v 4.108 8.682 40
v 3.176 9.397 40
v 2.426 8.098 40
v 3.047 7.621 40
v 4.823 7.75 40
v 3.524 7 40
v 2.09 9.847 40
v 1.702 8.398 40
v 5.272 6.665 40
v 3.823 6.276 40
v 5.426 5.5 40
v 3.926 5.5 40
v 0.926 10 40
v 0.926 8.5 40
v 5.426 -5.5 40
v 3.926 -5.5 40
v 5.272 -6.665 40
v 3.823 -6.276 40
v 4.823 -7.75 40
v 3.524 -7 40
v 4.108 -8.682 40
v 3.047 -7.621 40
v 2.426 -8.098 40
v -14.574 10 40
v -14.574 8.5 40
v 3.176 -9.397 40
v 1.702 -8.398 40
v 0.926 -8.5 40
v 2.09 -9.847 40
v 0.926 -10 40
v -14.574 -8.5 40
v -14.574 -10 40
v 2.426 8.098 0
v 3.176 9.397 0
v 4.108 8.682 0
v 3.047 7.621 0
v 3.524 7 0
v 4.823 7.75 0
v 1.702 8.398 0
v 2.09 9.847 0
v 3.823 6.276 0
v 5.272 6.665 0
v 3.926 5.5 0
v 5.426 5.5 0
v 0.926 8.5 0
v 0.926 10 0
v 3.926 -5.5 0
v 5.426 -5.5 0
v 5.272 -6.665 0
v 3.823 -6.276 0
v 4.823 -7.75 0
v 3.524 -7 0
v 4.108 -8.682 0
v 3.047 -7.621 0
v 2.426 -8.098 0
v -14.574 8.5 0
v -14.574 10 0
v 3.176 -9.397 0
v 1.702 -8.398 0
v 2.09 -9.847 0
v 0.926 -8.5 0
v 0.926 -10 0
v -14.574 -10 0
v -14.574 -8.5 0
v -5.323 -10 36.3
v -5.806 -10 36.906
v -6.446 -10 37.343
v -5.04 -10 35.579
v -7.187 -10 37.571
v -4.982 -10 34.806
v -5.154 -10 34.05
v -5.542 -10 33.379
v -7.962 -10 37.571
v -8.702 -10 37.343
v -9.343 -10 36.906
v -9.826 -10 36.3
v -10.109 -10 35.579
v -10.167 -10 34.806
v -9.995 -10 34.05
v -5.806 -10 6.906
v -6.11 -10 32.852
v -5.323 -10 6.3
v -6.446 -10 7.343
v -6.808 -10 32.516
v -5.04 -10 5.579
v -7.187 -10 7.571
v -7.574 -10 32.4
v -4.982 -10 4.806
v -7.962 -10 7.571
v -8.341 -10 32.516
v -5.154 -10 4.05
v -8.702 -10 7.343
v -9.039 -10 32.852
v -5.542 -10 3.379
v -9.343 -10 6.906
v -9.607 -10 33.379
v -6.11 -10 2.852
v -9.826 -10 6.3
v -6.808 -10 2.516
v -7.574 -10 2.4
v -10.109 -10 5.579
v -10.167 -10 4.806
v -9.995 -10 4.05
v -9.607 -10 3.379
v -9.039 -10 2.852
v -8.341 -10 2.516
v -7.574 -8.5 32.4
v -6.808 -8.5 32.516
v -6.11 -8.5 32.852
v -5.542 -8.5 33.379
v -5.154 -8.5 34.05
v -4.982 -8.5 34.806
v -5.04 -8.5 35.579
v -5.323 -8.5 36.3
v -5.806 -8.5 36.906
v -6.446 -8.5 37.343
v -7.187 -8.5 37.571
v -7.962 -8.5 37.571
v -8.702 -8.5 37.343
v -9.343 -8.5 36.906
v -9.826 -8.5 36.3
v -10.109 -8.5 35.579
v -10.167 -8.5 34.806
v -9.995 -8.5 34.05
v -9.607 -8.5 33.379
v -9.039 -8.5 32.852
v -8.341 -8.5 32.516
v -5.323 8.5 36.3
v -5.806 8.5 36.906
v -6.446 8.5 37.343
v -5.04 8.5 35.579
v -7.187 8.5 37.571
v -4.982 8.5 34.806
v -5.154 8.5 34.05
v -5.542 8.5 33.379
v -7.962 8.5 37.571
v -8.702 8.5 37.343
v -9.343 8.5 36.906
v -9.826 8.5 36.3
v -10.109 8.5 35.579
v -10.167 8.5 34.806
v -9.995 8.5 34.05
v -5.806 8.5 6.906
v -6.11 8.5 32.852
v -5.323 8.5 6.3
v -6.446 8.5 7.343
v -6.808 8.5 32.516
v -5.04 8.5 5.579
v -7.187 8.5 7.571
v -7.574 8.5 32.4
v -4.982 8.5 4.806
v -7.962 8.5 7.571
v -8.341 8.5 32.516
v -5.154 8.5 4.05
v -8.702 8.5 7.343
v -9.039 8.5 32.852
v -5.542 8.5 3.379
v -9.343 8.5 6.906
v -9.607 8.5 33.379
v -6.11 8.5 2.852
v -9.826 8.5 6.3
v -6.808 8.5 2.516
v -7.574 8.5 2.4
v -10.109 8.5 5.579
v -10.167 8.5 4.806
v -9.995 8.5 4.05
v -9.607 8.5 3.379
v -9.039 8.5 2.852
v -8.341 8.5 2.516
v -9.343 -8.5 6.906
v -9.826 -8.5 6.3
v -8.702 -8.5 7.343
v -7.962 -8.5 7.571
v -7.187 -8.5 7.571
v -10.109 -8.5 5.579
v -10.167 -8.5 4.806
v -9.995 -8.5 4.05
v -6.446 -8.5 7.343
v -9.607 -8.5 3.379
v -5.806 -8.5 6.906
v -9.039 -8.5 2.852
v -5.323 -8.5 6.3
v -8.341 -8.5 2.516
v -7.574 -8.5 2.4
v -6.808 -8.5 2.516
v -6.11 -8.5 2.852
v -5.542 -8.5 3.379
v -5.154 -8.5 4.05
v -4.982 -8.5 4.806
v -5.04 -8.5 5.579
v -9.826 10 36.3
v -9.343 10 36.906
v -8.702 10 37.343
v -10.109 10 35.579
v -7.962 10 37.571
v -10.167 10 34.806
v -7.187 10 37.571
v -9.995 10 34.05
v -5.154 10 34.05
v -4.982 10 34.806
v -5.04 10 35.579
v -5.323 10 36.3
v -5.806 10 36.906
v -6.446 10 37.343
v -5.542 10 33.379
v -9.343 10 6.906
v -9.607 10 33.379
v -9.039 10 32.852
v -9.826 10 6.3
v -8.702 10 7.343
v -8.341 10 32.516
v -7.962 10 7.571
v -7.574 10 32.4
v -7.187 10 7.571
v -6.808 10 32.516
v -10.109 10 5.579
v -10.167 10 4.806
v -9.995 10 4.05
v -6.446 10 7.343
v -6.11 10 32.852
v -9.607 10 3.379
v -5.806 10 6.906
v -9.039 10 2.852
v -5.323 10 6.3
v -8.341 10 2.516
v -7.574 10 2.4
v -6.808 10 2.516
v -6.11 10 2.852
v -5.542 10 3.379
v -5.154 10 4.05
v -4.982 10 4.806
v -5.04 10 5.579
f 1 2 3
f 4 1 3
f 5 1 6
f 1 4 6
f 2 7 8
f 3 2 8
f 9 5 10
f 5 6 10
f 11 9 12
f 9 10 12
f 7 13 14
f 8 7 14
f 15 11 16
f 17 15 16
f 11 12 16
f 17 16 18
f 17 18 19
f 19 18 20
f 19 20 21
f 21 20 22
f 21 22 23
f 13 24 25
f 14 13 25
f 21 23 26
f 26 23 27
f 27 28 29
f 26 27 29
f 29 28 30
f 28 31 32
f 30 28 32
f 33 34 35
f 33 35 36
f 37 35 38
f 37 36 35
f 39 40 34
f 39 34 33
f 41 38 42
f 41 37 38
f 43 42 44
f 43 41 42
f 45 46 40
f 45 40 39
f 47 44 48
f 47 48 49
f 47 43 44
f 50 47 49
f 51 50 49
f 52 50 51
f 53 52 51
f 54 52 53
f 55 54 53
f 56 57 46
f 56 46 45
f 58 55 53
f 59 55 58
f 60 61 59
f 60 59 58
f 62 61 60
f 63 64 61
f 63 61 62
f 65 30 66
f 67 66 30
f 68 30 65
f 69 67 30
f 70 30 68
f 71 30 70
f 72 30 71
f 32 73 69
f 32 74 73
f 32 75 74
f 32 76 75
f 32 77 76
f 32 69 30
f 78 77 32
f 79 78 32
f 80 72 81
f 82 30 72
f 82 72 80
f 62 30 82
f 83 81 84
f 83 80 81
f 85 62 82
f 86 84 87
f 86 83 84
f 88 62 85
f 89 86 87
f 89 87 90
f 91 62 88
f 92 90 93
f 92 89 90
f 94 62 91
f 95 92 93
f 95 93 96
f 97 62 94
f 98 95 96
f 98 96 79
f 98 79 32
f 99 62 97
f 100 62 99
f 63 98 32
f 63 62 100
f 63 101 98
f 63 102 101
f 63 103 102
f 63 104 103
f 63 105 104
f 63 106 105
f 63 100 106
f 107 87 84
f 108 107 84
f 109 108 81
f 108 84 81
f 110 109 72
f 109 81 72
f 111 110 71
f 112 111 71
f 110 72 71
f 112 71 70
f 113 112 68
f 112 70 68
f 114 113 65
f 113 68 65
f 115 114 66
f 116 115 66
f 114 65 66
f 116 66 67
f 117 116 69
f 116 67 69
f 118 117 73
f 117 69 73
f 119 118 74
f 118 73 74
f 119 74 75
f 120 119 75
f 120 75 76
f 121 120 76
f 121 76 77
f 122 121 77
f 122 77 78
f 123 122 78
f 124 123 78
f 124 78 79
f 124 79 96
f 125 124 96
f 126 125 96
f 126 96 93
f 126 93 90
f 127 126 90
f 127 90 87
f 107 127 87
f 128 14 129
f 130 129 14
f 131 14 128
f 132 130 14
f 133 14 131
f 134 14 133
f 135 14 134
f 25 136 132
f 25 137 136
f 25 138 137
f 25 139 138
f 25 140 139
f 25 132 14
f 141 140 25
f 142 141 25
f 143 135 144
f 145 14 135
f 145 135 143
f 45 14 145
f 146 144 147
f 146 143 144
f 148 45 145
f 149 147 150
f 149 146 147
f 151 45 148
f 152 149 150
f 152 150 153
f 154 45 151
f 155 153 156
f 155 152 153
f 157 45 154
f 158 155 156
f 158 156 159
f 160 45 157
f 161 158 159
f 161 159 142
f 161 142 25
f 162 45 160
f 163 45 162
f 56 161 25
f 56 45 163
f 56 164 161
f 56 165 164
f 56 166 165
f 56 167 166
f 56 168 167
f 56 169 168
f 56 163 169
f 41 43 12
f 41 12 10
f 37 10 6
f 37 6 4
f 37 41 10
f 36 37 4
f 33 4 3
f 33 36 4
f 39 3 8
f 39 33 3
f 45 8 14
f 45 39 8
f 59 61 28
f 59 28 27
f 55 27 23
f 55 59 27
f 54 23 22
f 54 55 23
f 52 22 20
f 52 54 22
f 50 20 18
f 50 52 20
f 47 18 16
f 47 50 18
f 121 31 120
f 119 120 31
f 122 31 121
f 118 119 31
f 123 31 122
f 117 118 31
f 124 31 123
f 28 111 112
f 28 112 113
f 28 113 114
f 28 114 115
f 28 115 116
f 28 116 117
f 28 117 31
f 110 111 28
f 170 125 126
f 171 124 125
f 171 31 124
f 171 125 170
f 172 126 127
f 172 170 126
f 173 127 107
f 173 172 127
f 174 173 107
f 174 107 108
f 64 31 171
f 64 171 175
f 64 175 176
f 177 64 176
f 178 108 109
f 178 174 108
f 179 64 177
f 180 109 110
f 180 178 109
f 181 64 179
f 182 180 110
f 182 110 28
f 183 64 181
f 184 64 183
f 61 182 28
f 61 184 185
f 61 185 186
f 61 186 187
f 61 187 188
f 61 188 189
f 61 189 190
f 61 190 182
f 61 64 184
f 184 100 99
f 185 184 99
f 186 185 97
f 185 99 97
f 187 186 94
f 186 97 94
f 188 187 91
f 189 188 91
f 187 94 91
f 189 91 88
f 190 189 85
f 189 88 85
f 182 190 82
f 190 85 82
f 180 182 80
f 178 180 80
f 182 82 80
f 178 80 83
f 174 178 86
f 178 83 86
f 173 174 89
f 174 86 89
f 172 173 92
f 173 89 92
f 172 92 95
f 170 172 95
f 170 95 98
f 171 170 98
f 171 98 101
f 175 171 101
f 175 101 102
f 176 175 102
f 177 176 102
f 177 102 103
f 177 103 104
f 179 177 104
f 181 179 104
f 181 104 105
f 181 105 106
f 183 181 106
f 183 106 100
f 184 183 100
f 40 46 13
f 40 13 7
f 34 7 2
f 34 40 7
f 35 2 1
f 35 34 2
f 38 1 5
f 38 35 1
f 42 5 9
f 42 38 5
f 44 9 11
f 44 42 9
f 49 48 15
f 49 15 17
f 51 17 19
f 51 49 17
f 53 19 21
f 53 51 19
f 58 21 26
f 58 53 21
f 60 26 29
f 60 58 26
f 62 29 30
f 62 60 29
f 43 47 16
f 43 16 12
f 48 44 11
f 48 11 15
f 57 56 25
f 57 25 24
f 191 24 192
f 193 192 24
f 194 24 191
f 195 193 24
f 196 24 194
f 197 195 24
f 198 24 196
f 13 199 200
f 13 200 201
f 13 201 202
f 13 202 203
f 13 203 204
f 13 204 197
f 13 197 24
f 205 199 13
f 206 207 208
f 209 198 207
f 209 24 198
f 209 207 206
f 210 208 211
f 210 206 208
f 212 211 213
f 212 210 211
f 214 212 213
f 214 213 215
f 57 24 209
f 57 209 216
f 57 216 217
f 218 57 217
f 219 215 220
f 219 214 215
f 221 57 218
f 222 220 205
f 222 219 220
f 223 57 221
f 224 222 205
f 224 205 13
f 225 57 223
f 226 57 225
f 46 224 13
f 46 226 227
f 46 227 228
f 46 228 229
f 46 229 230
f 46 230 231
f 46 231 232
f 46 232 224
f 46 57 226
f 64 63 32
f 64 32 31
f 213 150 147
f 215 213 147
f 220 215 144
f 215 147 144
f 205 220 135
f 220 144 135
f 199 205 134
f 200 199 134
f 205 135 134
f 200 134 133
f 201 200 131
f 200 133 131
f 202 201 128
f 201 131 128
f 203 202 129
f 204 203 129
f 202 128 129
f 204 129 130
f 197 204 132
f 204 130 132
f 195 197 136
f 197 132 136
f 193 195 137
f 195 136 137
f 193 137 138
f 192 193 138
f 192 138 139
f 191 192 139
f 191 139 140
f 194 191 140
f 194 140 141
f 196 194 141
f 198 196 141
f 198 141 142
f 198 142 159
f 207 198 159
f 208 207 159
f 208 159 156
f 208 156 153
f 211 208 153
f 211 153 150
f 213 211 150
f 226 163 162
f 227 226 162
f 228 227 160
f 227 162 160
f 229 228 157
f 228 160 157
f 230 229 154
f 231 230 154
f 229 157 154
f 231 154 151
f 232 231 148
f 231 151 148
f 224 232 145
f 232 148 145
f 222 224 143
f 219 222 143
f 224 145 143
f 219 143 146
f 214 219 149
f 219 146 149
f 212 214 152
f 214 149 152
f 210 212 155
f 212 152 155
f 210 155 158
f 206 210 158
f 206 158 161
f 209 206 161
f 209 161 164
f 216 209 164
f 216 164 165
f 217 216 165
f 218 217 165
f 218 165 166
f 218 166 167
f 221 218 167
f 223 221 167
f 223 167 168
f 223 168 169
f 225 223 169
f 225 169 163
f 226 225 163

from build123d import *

# Parameters (mm, degrees)
AUFSATZ_LINEAR_AUSTRAGEN1_DEPTH = 40
SCHNITT_LINEAR_AUSTRAGEN1_REACH = 49.036
SKIZZE2_R                       = 2.6


with BuildPart() as part:
    # Skizze1 → Aufsatz-Linear austragen1 (new body)
    with BuildSketch(Plane(origin=(0, 0, 0), x_dir=(0, 1, 0), z_dir=(0, 0, 1))):
        with BuildLine():
            Line((5.5, -5.425677432), (-5.5, -5.425677432))
            ThreePointArc((-5.5, -5.425677432), (-8.681980515, -4.107657947), (-10, -0.925677432))
            Line((-10, -0.925677432), (-10, 14.574322568))
            Line((-10, 14.574322568), (-8.5, 14.574322568))
            Line((-8.5, 14.574322568), (-8.5, -0.925677432))
            ThreePointArc((-8.5, -0.925677432), (-7.621320344, -3.046997775), (-5.5, -3.925677432))
            Line((-5.5, -3.925677432), (5.5, -3.925677432))
            ThreePointArc((5.5, -3.925677432), (7.621320344, -3.046997775), (8.5, -0.925677432))
            Line((8.5, -0.925677432), (8.5, 14.574322568))
            Line((8.5, 14.574322568), (10, 14.574322568))
            Line((10, 14.574322568), (10, -0.925677432))
            ThreePointArc((10, -0.925677432), (8.681980515, -4.107657947), (5.5, -5.425677432))
        make_face()
    extrude(amount=AUFSATZ_LINEAR_AUSTRAGEN1_DEPTH)

    # Schnitt-Linear austragen1: up to this face of the body (flat: up to its plane)
    schnitt_linear_austragen1_end = Plane(part.part.faces().sort_by_distance((-6.824322568, 10, 20))[0])
    # Skizze2 → Schnitt-Linear austragen1 (cut, up to the picked face)
    with BuildSketch(Plane.XZ.offset(10), mode=Mode.PRIVATE) as schnitt_linear_austragen1_sk1:
        with Locations(Location((-7.574322568, 35, 0), (0, 0, 270))):
            Circle(SKIZZE2_R)
    schnitt_linear_austragen1_tool1 = split(extrude(schnitt_linear_austragen1_sk1.sketch, amount=-SCHNITT_LINEAR_AUSTRAGEN1_REACH, mode=Mode.PRIVATE), bisect_by=schnitt_linear_austragen1_end, keep=Keep.BOTH, mode=Mode.PRIVATE)
    # Skizze2 → Schnitt-Linear austragen1 (cut, up to the picked face)
    with BuildSketch(Plane.XZ.offset(10), mode=Mode.PRIVATE) as schnitt_linear_austragen1_sk2:
        with Locations(Location((-7.574322568, 5, 0), (0, 0, 270))):
            Circle(SKIZZE2_R)
    schnitt_linear_austragen1_tool2 = split(extrude(schnitt_linear_austragen1_sk2.sketch, amount=-SCHNITT_LINEAR_AUSTRAGEN1_REACH, mode=Mode.PRIVATE), bisect_by=schnitt_linear_austragen1_end, keep=Keep.BOTH, mode=Mode.PRIVATE)
    add(schnitt_linear_austragen1_tool1.solids().sort_by(Axis((-7.574323, -10, 35), (0, 1, 0)))[0], mode=Mode.SUBTRACT)
    add(schnitt_linear_austragen1_tool2.solids().sort_by(Axis((-7.574323, -10, 5), (0, 1, 0)))[0], mode=Mode.SUBTRACT)


solid = part.part
